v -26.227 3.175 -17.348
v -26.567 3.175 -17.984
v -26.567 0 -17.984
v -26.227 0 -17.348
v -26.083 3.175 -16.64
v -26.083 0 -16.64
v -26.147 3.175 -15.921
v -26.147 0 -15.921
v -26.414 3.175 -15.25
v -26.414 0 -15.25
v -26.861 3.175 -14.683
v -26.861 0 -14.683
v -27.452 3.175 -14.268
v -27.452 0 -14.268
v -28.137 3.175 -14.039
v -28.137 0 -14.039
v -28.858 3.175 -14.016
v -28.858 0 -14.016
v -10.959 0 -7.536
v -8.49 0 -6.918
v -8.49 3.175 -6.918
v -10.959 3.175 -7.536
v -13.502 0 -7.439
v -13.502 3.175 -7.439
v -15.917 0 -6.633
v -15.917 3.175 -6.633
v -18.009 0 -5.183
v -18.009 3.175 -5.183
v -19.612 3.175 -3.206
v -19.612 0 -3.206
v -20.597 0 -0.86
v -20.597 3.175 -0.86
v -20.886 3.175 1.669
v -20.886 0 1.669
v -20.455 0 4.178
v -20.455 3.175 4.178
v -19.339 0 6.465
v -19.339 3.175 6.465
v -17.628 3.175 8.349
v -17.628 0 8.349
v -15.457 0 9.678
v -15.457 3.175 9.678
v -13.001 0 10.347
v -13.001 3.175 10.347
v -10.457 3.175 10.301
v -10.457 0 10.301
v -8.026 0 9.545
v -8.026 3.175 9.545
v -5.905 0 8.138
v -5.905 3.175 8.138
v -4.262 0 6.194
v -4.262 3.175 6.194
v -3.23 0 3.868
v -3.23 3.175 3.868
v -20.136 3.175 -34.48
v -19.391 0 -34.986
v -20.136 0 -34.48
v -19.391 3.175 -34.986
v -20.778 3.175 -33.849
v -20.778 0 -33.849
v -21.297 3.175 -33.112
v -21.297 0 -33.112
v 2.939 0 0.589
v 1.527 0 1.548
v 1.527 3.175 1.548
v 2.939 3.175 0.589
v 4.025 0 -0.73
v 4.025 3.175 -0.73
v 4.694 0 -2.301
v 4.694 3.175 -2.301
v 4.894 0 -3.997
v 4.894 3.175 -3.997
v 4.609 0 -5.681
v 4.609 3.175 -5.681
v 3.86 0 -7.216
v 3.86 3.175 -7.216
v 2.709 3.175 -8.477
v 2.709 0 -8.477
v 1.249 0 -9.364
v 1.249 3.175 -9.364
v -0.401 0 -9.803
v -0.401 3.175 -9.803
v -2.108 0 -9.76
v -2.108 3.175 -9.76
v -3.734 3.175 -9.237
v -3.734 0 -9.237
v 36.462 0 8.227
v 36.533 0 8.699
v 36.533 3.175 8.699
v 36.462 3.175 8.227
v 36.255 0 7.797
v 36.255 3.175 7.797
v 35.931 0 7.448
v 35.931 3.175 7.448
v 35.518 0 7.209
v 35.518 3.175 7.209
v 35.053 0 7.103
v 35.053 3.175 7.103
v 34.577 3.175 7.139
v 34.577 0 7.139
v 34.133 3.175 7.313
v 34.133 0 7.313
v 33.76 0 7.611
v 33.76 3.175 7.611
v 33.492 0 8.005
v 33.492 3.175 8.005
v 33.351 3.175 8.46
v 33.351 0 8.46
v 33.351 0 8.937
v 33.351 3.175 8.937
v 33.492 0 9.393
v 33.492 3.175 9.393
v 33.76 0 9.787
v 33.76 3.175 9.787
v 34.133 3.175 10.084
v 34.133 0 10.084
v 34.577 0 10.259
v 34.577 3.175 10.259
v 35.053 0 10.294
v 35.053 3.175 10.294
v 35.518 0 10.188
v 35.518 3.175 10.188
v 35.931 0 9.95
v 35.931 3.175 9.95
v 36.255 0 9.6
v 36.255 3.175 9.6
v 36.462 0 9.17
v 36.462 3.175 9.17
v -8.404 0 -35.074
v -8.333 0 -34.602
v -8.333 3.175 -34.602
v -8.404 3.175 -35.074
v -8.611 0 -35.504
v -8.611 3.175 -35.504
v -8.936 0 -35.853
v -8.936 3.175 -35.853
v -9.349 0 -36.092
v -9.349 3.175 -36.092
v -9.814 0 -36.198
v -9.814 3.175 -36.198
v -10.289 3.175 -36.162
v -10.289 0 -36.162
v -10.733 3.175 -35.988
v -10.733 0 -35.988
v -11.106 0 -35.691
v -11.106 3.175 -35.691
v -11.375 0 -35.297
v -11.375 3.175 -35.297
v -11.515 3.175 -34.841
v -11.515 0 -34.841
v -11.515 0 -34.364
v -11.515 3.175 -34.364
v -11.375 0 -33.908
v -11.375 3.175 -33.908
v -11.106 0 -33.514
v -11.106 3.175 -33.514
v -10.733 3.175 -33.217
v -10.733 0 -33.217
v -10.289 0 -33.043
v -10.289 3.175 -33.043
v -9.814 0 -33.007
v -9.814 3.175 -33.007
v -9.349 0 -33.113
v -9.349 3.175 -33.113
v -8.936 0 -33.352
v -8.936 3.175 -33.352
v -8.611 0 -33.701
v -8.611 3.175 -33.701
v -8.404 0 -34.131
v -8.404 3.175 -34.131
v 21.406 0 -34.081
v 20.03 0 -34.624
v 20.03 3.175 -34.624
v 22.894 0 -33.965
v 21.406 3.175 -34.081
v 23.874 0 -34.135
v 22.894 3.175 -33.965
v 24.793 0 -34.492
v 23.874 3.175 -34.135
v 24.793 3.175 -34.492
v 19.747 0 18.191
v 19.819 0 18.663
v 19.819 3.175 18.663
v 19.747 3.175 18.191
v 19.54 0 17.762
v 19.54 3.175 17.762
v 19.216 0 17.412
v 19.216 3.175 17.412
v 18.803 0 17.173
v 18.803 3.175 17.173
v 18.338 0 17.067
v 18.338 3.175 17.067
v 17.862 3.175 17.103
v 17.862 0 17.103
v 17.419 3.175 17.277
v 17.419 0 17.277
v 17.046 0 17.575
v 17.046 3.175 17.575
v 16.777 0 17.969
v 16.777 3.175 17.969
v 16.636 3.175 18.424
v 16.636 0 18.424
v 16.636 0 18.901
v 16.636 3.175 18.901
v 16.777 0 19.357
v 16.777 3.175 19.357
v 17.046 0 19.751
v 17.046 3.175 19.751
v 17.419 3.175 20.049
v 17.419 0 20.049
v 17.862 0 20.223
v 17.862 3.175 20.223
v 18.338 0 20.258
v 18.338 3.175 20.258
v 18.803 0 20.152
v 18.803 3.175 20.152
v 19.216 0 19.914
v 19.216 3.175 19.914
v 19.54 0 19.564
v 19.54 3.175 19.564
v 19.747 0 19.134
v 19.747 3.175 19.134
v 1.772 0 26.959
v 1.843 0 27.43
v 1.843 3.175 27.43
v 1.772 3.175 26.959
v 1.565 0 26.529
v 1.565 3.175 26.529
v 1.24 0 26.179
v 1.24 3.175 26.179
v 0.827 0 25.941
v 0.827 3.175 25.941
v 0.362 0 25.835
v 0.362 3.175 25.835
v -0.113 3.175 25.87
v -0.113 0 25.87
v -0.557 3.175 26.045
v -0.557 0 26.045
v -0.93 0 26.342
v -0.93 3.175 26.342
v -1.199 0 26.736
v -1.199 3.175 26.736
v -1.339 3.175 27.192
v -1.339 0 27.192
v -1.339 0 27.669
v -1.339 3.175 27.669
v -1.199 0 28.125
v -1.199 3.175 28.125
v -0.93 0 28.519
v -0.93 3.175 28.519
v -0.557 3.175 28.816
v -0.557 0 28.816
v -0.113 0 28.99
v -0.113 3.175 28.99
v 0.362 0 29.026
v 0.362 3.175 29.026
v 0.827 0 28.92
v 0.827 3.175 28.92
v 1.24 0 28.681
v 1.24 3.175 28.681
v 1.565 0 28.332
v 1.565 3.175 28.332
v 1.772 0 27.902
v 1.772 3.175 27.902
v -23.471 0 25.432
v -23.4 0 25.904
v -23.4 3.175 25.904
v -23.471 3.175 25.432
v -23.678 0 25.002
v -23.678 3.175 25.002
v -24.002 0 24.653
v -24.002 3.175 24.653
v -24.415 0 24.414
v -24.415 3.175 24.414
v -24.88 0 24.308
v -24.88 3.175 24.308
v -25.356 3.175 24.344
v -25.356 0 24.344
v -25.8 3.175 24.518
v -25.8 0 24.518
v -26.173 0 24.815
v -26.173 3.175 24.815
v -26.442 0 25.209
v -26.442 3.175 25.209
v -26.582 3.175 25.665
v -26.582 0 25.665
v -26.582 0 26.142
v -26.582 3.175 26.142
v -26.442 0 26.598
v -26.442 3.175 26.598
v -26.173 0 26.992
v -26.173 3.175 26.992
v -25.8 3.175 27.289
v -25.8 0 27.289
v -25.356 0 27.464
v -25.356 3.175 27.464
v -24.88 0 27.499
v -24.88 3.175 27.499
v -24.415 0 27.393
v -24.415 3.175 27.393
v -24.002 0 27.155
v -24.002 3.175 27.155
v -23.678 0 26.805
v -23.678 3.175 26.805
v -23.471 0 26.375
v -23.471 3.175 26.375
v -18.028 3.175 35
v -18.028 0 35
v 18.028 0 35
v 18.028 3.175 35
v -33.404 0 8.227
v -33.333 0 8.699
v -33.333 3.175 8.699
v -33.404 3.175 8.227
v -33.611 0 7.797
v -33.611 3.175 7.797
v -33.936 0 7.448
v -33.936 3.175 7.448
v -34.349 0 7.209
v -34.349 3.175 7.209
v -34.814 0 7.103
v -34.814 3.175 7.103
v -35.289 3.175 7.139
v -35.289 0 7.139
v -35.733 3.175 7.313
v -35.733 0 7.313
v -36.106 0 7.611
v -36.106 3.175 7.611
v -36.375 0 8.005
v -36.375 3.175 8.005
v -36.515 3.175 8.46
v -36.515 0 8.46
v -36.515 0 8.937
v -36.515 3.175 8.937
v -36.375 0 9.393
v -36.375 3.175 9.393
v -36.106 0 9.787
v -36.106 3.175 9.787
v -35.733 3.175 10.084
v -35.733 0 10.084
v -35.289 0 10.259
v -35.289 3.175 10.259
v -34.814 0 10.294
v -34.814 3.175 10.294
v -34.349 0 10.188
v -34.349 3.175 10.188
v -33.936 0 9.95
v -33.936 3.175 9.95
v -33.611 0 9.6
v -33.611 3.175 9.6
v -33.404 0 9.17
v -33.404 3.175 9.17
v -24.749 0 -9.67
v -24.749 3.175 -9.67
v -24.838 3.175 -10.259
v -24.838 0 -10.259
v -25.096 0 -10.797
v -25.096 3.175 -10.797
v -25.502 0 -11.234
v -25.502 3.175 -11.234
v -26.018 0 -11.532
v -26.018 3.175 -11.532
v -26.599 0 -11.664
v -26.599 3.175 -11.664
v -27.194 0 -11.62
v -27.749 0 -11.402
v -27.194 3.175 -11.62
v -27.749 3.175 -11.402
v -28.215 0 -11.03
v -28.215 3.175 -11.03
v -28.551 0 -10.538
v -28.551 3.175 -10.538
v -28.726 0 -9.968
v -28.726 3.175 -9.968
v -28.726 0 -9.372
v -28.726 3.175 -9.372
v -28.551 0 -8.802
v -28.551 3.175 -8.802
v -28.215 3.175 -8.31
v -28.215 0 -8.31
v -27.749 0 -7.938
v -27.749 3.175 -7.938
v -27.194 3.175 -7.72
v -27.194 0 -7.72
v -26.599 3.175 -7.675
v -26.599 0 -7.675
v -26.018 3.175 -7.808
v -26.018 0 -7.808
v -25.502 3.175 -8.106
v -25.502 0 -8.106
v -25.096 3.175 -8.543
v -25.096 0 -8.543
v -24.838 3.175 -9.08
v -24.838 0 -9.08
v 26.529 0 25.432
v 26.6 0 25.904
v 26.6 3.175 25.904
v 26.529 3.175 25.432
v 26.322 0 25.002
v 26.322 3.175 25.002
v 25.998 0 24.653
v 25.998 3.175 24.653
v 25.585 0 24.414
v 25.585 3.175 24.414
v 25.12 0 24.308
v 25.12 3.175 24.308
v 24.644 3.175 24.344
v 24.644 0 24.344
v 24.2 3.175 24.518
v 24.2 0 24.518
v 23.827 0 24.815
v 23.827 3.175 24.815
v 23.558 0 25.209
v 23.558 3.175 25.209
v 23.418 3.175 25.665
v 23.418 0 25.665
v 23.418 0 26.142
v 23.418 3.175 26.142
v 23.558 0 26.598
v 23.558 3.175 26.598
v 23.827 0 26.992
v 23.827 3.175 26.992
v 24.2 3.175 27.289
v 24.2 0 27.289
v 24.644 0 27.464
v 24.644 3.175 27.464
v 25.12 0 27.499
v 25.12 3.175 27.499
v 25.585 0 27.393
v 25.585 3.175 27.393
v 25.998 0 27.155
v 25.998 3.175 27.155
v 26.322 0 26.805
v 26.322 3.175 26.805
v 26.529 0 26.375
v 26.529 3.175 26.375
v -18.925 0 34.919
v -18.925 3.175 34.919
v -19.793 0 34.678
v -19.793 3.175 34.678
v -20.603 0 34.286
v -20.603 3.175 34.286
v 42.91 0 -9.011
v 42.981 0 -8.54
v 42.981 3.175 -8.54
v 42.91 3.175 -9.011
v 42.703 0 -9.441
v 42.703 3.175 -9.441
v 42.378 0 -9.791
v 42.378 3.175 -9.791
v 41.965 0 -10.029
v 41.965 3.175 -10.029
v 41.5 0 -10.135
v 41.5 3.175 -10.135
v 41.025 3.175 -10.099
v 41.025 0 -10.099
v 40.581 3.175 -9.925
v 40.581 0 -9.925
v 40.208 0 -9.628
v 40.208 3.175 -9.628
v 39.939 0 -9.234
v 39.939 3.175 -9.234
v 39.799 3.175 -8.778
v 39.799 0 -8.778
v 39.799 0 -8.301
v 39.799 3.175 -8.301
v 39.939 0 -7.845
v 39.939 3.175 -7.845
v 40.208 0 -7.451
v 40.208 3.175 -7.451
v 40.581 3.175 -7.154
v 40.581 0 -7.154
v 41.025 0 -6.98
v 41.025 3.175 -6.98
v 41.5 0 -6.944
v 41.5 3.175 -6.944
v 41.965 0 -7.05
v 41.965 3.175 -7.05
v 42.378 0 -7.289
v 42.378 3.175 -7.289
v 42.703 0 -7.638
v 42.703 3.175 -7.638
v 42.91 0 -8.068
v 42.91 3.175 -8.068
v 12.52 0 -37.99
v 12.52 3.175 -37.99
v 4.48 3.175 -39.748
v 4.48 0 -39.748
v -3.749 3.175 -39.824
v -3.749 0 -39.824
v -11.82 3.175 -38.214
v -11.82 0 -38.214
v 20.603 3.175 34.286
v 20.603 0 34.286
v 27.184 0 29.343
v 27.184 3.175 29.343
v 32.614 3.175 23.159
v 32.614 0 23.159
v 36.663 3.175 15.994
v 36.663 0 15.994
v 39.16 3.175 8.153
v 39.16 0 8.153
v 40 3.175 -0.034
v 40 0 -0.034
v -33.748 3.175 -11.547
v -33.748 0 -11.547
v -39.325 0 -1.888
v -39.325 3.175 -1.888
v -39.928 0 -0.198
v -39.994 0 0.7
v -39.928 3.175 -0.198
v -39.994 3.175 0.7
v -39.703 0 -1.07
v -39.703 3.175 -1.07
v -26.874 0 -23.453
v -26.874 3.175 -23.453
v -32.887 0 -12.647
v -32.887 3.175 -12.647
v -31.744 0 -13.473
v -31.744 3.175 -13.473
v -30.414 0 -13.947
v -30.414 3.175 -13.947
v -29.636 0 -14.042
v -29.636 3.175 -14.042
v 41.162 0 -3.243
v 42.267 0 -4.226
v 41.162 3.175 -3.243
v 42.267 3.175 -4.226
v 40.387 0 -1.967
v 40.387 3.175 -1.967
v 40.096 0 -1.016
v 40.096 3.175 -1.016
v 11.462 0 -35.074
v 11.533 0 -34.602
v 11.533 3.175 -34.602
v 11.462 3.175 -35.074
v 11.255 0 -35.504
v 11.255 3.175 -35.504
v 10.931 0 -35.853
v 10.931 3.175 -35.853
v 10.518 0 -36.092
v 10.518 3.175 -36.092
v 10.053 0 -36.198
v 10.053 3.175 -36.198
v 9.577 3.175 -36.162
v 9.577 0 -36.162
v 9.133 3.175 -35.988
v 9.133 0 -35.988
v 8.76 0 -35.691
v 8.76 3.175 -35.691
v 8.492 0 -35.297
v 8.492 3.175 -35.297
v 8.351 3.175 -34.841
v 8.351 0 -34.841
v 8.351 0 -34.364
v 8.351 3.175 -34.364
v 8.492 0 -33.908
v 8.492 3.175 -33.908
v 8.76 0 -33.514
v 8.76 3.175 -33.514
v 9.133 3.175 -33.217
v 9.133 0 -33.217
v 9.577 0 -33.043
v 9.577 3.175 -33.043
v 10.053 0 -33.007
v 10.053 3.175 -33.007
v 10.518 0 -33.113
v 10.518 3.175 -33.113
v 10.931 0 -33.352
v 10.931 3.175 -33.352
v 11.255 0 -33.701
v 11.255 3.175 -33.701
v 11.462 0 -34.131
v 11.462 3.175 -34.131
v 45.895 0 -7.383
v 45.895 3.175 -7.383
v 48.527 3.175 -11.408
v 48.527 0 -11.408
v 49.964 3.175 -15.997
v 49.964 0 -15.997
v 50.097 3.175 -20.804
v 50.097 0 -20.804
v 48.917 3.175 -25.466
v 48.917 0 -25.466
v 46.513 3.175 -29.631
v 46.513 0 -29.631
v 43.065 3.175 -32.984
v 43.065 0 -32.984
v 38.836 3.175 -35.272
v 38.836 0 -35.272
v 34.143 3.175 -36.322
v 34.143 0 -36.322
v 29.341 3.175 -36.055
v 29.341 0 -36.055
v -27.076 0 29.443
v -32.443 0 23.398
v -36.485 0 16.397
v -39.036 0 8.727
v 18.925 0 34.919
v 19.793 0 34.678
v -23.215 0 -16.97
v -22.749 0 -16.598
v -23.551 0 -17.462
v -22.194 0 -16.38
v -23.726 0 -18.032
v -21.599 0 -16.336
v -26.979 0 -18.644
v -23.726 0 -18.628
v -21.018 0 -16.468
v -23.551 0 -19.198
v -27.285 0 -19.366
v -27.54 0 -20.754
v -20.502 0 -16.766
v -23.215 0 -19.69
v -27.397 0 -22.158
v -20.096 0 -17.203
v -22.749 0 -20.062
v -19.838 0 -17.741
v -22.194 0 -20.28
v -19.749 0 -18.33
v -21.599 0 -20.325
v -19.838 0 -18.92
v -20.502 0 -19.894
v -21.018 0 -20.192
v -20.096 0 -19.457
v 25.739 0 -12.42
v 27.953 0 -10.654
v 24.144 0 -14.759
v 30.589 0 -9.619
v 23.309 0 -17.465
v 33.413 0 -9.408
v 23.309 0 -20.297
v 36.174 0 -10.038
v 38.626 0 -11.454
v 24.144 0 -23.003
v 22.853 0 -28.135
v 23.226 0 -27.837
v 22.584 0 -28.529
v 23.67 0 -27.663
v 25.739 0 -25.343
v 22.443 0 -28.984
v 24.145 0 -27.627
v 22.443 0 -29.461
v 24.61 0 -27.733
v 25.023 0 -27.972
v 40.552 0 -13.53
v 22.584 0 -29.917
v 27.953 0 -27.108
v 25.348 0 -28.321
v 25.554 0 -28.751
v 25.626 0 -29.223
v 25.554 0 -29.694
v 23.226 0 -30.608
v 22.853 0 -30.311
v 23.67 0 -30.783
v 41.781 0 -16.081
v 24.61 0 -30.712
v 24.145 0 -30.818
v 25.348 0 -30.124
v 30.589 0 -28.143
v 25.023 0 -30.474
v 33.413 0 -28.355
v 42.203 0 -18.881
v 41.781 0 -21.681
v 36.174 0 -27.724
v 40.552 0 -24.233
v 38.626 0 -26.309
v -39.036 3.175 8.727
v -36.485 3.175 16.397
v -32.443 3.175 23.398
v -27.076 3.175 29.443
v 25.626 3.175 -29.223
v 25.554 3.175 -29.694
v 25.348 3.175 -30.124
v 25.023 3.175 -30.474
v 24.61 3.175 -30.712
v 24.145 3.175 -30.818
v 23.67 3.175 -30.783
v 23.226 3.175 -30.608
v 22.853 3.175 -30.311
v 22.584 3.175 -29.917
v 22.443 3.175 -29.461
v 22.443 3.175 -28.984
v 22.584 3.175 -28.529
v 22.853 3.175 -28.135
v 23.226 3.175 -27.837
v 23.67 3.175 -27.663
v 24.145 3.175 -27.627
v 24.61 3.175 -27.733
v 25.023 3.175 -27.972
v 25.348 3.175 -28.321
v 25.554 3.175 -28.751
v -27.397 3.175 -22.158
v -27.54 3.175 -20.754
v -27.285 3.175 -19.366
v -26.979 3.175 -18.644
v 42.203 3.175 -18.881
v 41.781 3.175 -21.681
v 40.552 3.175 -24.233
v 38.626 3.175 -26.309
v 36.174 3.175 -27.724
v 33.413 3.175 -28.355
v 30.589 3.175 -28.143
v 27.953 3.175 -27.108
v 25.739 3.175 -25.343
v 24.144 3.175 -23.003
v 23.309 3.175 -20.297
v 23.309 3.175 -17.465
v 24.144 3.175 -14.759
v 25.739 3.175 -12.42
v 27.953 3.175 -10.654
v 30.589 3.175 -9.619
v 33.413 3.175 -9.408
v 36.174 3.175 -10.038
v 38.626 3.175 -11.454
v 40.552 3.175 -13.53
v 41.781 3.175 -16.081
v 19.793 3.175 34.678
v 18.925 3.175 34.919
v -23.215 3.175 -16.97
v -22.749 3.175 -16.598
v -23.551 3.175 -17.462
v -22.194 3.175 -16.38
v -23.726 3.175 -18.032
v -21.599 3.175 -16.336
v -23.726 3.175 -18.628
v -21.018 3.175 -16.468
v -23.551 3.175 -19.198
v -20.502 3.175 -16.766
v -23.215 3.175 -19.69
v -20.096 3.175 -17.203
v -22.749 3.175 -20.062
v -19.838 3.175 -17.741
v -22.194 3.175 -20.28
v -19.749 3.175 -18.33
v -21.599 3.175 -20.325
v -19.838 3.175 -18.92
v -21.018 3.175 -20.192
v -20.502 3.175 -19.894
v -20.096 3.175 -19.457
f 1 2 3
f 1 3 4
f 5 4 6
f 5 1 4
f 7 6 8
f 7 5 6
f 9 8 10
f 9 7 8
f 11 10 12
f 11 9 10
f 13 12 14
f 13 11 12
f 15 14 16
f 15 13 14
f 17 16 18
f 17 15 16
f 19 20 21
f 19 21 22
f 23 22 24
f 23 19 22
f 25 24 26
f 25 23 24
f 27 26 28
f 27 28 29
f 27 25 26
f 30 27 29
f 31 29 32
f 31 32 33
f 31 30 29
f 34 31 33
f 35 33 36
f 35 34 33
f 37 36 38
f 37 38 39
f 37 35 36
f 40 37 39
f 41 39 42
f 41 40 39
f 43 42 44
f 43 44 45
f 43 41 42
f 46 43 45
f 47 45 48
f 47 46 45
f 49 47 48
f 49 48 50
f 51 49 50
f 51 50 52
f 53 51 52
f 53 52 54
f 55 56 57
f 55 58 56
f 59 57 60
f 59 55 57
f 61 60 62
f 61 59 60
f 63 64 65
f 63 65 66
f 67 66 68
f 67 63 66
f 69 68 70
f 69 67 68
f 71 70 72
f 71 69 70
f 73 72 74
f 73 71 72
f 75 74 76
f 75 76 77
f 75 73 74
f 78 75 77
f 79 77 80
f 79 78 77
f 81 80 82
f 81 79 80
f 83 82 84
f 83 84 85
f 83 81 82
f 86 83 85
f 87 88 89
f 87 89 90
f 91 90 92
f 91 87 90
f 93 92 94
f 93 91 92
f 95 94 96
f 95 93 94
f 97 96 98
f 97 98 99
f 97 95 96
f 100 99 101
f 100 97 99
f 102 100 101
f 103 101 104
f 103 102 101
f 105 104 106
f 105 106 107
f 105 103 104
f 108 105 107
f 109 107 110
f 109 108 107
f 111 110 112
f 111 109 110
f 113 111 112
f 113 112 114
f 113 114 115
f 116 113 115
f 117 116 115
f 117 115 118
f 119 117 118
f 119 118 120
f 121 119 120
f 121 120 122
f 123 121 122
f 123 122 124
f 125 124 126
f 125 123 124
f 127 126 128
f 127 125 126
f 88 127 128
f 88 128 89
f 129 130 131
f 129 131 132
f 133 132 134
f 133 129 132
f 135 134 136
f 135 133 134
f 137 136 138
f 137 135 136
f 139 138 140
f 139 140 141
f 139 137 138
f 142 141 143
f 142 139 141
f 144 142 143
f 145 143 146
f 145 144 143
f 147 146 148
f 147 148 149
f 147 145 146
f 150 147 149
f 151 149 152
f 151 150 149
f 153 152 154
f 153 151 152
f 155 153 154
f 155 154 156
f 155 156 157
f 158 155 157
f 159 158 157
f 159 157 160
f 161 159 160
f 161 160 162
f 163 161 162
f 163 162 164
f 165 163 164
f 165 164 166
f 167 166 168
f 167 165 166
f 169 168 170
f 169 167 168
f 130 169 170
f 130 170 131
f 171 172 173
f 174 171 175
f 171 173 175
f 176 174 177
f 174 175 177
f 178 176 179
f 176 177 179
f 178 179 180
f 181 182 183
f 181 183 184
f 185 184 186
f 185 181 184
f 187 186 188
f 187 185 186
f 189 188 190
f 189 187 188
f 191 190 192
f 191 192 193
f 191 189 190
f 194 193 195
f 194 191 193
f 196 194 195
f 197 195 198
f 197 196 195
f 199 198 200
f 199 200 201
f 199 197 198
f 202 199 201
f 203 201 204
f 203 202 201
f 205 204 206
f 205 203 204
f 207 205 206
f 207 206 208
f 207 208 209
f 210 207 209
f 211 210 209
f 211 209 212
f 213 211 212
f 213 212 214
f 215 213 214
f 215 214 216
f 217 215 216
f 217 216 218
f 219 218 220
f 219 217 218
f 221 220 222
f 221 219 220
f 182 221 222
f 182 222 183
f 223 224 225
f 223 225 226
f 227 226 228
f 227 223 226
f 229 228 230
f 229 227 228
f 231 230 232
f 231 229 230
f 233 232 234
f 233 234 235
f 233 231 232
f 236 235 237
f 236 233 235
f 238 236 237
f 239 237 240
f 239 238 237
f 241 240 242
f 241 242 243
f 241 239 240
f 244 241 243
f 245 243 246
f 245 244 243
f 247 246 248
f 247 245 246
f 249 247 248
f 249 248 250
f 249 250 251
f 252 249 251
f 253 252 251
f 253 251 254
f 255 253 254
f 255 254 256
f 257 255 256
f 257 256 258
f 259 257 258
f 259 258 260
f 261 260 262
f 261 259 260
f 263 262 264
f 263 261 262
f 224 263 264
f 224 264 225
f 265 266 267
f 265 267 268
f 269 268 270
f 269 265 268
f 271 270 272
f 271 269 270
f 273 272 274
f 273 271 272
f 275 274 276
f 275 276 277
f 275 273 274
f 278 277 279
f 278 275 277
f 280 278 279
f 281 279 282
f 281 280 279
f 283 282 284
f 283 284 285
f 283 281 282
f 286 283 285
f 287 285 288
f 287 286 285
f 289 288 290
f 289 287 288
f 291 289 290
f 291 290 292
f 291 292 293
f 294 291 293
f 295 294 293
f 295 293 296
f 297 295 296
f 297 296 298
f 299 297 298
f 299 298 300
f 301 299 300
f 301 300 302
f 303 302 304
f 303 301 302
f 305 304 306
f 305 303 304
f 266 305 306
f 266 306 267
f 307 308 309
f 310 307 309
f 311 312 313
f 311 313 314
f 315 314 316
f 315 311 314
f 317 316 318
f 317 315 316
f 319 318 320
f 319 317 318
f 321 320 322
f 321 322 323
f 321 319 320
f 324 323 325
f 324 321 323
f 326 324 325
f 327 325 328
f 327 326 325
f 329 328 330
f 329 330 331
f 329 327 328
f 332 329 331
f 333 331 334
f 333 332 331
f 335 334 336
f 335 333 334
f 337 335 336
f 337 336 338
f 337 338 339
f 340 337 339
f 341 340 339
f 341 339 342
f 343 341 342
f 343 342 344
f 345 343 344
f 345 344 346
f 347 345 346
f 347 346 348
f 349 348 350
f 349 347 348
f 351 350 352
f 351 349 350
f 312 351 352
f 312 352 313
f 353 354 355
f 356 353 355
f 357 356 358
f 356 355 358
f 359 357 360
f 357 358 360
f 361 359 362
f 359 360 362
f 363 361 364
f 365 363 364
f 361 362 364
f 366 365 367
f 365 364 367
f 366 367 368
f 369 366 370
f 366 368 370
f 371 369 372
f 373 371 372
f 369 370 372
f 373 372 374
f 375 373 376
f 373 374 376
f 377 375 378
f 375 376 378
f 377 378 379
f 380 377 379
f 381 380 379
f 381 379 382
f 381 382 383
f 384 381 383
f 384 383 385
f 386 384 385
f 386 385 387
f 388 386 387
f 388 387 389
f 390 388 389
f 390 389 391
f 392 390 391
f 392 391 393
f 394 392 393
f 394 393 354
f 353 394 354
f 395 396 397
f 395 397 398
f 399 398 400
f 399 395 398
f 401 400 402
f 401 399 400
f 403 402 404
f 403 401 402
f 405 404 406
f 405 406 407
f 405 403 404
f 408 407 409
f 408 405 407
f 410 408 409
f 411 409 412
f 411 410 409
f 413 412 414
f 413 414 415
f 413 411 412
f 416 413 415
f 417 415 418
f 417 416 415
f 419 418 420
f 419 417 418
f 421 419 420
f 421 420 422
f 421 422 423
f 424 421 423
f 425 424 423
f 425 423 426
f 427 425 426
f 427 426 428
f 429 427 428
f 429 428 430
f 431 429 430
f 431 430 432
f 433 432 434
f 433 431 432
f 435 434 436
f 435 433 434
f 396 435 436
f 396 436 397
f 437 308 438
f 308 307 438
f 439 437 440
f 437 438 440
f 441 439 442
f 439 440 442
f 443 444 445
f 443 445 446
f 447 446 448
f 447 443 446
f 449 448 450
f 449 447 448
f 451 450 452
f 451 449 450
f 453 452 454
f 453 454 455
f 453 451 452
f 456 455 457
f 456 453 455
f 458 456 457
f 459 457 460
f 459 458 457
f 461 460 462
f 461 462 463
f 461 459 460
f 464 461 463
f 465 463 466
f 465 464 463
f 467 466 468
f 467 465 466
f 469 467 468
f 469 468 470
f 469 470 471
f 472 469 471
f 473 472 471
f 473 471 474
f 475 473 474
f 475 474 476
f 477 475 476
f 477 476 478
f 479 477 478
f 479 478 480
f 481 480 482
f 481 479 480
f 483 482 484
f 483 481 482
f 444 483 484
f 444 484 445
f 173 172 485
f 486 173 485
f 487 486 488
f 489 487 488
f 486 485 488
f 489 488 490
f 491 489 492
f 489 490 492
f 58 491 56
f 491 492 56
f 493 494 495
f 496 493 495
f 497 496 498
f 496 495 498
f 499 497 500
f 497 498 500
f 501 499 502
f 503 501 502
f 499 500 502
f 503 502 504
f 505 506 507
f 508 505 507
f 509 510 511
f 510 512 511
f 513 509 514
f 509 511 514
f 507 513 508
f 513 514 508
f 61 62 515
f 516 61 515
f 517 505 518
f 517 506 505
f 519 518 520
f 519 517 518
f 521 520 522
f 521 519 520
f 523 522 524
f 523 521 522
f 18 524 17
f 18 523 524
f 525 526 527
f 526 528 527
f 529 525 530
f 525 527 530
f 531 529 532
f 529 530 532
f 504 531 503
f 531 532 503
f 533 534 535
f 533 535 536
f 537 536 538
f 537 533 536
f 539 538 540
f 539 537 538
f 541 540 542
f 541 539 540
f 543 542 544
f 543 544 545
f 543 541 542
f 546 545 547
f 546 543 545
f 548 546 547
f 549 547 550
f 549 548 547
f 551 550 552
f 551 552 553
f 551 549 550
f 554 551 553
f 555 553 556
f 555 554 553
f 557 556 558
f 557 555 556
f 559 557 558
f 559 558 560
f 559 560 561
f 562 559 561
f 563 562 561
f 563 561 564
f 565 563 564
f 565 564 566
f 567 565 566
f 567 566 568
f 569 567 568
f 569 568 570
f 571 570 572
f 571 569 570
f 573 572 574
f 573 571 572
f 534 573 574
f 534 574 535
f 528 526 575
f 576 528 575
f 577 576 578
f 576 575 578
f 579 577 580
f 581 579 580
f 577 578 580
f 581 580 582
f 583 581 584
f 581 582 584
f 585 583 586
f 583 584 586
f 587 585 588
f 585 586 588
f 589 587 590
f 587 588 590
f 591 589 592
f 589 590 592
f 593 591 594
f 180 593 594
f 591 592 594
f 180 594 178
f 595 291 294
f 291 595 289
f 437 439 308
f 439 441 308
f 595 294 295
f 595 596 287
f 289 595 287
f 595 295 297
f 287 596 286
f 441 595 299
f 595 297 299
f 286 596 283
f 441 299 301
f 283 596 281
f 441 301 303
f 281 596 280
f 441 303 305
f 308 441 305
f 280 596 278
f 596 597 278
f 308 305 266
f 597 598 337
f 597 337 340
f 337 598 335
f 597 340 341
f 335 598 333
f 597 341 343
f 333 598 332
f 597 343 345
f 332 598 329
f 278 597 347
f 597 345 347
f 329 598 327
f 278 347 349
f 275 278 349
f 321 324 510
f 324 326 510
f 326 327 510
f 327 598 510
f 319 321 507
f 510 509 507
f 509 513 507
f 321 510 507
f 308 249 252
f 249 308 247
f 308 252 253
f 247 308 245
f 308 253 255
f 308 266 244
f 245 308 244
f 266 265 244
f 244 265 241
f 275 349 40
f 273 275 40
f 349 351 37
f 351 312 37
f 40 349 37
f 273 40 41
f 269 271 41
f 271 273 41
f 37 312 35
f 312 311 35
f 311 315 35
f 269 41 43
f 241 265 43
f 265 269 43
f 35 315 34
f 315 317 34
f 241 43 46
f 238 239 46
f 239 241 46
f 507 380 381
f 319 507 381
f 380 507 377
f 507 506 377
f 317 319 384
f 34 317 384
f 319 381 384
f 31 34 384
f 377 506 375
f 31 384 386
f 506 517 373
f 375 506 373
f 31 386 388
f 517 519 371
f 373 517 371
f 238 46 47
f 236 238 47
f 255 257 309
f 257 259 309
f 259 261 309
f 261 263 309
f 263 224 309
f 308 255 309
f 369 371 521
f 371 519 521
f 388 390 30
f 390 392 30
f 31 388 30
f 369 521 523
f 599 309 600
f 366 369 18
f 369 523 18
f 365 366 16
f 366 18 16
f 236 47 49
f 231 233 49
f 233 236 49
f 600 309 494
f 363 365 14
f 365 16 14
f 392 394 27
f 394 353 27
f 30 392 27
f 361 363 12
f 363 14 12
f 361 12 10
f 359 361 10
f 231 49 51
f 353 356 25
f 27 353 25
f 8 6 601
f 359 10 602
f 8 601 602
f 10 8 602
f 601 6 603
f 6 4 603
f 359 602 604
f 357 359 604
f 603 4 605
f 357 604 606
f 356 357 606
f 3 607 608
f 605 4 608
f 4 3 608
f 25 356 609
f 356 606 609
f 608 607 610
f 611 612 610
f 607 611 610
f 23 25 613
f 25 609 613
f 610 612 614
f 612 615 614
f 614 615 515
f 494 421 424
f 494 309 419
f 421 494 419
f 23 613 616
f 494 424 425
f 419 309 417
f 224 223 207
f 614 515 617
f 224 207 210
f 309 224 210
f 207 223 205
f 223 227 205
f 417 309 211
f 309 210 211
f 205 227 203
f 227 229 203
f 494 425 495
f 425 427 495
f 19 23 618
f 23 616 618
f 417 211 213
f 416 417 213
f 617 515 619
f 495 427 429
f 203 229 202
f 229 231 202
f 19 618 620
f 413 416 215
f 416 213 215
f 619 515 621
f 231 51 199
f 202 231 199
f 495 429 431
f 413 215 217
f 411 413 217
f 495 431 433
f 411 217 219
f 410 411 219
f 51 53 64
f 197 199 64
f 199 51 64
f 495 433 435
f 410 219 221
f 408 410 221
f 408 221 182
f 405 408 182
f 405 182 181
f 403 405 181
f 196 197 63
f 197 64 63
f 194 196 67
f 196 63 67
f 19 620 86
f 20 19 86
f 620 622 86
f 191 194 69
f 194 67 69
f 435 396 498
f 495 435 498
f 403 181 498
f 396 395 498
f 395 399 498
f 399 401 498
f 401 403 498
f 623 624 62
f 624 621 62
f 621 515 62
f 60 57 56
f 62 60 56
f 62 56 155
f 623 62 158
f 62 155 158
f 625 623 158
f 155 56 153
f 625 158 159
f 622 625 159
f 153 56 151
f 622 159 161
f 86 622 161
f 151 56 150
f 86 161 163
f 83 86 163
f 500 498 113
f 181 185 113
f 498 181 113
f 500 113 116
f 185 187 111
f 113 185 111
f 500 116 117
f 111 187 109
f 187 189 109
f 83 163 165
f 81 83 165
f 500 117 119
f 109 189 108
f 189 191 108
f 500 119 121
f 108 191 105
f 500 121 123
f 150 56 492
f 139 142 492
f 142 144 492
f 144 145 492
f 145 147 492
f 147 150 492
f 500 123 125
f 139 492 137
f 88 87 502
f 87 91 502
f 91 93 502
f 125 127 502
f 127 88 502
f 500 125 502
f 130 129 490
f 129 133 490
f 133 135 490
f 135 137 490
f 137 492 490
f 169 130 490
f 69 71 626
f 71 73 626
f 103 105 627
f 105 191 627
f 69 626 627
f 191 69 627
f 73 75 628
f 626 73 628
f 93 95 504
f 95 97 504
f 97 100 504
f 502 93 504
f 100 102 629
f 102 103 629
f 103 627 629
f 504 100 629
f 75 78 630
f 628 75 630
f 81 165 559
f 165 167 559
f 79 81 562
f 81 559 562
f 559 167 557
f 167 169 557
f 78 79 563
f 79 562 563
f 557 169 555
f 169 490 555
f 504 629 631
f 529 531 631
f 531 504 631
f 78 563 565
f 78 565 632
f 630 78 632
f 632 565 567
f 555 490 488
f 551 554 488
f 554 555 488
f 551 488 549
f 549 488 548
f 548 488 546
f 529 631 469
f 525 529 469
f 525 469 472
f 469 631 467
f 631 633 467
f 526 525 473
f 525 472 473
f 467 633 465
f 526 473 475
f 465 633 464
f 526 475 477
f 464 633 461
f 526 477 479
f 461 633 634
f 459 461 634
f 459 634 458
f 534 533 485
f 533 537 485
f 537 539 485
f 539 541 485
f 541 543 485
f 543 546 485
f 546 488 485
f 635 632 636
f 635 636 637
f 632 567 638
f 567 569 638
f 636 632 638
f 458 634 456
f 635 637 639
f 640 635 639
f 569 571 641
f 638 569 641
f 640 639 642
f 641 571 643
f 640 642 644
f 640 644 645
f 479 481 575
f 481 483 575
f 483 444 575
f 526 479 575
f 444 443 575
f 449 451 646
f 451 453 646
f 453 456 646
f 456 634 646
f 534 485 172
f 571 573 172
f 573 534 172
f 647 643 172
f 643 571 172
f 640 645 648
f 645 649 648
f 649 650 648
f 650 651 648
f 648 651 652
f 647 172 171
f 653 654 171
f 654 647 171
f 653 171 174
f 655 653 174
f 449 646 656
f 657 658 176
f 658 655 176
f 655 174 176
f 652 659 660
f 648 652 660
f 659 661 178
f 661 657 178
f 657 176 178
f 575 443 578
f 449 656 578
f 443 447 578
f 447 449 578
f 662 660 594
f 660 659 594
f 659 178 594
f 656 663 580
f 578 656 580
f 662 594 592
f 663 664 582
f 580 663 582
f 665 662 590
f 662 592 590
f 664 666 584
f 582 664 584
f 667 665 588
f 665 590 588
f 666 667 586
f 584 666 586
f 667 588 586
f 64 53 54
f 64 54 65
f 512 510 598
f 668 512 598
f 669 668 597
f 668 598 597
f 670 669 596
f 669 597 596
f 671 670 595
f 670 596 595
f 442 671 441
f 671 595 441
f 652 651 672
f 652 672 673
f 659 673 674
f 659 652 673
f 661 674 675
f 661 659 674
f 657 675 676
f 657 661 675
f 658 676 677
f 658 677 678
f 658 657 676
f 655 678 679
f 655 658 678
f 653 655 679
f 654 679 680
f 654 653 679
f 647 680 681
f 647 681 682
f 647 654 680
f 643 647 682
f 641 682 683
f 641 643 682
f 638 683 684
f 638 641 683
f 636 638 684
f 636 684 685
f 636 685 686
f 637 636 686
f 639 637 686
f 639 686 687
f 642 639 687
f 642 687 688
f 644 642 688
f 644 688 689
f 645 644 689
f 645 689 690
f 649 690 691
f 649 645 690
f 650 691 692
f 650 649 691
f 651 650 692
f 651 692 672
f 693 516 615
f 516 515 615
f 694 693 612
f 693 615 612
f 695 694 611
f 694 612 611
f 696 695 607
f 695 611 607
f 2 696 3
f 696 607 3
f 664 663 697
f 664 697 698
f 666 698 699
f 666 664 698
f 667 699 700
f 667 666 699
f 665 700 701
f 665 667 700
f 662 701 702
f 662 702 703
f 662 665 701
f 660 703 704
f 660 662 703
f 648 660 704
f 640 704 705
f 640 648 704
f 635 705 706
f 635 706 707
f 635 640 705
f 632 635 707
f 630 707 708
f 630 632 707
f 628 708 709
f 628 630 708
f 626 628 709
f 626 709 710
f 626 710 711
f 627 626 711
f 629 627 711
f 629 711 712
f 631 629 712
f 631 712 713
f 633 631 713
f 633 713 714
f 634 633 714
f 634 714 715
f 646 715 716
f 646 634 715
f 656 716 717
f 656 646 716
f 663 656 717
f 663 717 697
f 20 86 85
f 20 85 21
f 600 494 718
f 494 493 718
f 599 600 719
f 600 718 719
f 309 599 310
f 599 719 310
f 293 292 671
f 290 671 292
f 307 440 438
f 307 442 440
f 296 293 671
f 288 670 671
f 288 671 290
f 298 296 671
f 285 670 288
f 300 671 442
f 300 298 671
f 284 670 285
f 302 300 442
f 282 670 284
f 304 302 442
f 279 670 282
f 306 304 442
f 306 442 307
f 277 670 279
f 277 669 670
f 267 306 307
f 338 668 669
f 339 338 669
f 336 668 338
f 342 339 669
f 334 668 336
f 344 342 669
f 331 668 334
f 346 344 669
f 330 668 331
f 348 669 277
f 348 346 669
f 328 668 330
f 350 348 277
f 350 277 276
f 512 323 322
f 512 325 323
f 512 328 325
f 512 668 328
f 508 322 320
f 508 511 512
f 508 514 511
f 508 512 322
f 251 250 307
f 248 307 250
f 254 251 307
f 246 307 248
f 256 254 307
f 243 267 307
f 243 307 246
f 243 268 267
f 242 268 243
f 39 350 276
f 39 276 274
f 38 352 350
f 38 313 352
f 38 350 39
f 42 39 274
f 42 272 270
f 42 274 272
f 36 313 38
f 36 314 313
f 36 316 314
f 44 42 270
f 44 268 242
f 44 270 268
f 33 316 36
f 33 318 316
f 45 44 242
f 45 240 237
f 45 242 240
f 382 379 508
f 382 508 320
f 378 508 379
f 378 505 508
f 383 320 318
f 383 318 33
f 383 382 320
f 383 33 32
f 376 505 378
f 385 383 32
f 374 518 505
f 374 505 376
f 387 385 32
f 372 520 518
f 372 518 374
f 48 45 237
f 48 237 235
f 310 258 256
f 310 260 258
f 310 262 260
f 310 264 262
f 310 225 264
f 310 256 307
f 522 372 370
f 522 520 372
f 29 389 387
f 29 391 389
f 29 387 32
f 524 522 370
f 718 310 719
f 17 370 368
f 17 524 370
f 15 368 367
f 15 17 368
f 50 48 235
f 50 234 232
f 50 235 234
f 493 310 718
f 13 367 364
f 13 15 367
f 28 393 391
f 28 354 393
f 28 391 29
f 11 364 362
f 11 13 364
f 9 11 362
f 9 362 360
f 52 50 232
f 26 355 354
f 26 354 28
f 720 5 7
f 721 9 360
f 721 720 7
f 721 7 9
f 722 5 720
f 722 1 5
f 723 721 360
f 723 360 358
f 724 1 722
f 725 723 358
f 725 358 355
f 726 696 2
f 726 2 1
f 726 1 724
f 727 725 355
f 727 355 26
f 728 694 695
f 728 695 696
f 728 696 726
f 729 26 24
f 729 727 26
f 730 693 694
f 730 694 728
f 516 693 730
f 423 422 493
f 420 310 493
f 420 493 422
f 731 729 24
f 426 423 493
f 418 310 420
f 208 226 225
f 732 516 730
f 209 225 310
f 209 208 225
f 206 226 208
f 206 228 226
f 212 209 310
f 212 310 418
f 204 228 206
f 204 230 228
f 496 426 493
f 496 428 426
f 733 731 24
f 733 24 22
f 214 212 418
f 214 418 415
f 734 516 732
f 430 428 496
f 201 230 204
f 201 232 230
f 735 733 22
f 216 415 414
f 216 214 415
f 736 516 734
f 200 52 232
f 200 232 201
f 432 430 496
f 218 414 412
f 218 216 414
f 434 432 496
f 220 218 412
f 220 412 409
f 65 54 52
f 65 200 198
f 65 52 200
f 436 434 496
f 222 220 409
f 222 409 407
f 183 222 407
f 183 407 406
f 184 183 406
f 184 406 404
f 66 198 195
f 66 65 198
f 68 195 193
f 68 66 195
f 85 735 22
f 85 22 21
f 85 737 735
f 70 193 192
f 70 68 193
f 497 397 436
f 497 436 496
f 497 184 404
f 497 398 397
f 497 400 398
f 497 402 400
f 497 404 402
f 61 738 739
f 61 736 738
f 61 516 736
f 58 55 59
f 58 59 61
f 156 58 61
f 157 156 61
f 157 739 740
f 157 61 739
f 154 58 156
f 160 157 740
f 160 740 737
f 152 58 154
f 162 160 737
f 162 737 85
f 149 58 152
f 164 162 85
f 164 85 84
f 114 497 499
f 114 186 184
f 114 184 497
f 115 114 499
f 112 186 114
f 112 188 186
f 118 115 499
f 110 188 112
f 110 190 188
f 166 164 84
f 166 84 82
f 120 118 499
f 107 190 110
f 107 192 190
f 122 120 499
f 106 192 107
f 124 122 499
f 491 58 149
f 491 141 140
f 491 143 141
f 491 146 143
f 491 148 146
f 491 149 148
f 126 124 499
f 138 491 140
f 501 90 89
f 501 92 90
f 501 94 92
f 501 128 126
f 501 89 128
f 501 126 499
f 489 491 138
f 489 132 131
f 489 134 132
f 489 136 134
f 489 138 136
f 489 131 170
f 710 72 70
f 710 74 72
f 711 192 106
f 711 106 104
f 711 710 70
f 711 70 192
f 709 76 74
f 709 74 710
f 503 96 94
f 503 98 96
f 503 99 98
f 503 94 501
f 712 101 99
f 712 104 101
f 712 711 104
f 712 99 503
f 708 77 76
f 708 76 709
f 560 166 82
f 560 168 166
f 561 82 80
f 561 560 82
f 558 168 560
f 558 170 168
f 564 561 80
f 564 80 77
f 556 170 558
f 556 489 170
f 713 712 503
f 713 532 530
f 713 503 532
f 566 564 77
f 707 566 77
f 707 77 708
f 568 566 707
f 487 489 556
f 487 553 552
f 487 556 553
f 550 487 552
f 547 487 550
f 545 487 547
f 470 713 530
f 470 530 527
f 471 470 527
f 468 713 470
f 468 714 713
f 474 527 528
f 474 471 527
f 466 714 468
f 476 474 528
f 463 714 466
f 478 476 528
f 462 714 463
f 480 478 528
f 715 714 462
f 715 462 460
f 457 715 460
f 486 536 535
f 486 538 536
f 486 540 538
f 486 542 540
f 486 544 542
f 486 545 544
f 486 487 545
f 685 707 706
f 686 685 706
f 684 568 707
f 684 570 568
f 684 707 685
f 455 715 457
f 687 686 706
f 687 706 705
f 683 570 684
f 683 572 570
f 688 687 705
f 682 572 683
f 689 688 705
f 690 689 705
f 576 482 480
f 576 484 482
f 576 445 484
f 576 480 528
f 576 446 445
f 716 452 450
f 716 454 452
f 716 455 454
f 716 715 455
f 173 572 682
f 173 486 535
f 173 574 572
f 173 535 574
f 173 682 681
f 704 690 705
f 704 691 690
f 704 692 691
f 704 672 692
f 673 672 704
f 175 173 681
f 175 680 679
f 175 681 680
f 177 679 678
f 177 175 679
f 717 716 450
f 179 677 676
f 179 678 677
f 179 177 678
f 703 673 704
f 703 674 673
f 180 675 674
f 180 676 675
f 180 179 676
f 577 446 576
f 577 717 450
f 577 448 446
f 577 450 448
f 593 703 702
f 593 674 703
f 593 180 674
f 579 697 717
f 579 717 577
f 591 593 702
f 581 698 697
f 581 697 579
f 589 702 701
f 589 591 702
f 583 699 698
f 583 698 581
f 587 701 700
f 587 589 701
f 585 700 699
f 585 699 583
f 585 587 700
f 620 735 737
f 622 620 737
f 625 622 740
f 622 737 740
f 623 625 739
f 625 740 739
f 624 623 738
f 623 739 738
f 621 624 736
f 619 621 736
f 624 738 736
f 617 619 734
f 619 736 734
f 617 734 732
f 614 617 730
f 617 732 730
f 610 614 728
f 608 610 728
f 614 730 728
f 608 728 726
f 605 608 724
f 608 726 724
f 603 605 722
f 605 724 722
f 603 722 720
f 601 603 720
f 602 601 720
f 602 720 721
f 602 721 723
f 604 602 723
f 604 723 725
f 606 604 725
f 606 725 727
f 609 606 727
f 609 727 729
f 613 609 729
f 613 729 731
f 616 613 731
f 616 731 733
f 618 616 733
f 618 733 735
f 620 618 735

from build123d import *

# Parameters (mm, degrees)
SKETCH2_R           = 9.5
SKETCH2_R_2         = 1.599999999
BOSS_EXTRUDE1_DEPTH = 3.175
FILLET1_R           = 5
CUT_EXTRUDE1_REACH  = 5.175
SKETCH3_R           = 2
FILLET2_R           = 5


with BuildPart() as part:
    # Sketch2 → Boss-Extrude1 (new body)
    with BuildSketch(Plane(origin=(0, 0, 0), x_dir=(1, 0, 0), z_dir=(0, 1, 0))):
        with BuildLine():
            Line((-20.628430767, 34.270509831), (-39.993347498, 0.729490169))
            ThreePointArc((-39.993347498, 0.729490169), (-34.641016151, -20), (-19.364916731, -35))
            Line((-19.364916731, -35), (19.364916731, -35))
            ThreePointArc((19.364916731, -35), (35.177698311, -19.040208548), (39.892817403, 2.92628085))
            ThreePointArc((39.892817403, 2.92628085), (47.858623368, 27.631189084), (22.480642256, 33.085052875))
            ThreePointArc((22.480642256, 33.085052875), (1.09954486, 39.984884658), (-20.628430767, 34.270509831))
        make_face()
        with Locations((32.703178801, 18.881189084)):
            Circle(SKETCH2_R, mode=Mode.SUBTRACT)
        with Locations((-9.933234274, 34.602468942)):
            Circle(SKETCH2_R_2, mode=Mode.SUBTRACT)
        with Locations((34.933234274, -8.698801248)):
            Circle(SKETCH2_R_2, mode=Mode.SUBTRACT)
        with Locations((24.025546071, 29.222789066)):
            Circle(SKETCH2_R_2, mode=Mode.SUBTRACT)
        with Locations((41.380811532, 8.539589102)):
            Circle(SKETCH2_R_2, mode=Mode.SUBTRACT)
        with Locations((9.933234274, 34.602468942)):
            Circle(SKETCH2_R_2, mode=Mode.SUBTRACT)
        with Locations((18.218514563, -18.662886757)):
            Circle(SKETCH2_R_2, mode=Mode.SUBTRACT)
        with Locations((-25, -25.903667694)):
            Circle(SKETCH2_R_2, mode=Mode.SUBTRACT)
        with Locations((0.242633637, -27.430309692)):
            Circle(SKETCH2_R_2, mode=Mode.SUBTRACT)
        with Locations((25, -25.903667694)):
            Circle(SKETCH2_R_2, mode=Mode.SUBTRACT)
        with Locations((-34.933234274, -8.698801248)):
            Circle(SKETCH2_R_2, mode=Mode.SUBTRACT)
        with BuildLine():
            Line((-3.733919578, 9.237483049), (-8.490154378, 6.917712338))
            ThreePointArc((-8.490154378, 6.917712338), (-19.978367669, -5.361075311), (-3.229700616, -3.867816217))
            Line((-3.229700616, -3.867816217), (1.526534184, -1.548045507))
            ThreePointArc((1.526534184, -1.548045507), (4.289071581, 6.474945652), (-3.733919578, 9.237483049))
        make_face(mode=Mode.SUBTRACT)
    extrude(amount=BOSS_EXTRUDE1_DEPTH)

    # Fillet1
    fillet1_edges = [part.edges().sort_by_distance(p)[0] for p in [
        (39.892817403, 1.5875, -2.92628085),
        (22.480642256, 1.5875, -33.085052875),
    ]]
    fillet(fillet1_edges, radius=FILLET1_R)

    # Sketch3 → Cut-Extrude1 (cut, up to next)
    with BuildSketch(Plane(origin=(0, 3.175, 0), x_dir=(1, 0, 0), z_dir=(0, 1, 0)), mode=Mode.PRIVATE) as cut_extrude1_sk1:
        with Locations((-26.748711306, 9.669872981)):
            Circle(SKETCH3_R)
    cut_extrude1_tool1 = extrude(cut_extrude1_sk1.sketch, amount=-CUT_EXTRUDE1_REACH, mode=Mode.PRIVATE) & part.part
    add(cut_extrude1_tool1.solids().sort_by_distance((-26.748711, 3.175, -9.669873))[0], mode=Mode.SUBTRACT)
    # Sketch3 → Cut-Extrude1 (cut, up to next)
    with BuildSketch(Plane(origin=(0, 3.175, 0), x_dir=(1, 0, 0), z_dir=(0, 1, 0)), mode=Mode.PRIVATE) as cut_extrude1_sk2:
        with Locations((-21.748711306, 18.330127019)):
            Circle(SKETCH3_R)
    cut_extrude1_tool2 = extrude(cut_extrude1_sk2.sketch, amount=-CUT_EXTRUDE1_REACH, mode=Mode.PRIVATE) & part.part
    add(cut_extrude1_tool2.solids().sort_by_distance((-21.748711, 3.175, -18.330127))[0], mode=Mode.SUBTRACT)
    # Sketch3 → Cut-Extrude1 (cut, up to next)
    with BuildSketch(Plane(origin=(0, 3.175, 0), x_dir=(1, 0, 0), z_dir=(0, 1, 0)), mode=Mode.PRIVATE) as cut_extrude1_sk3:
        with BuildLine():
            Line((-29.060889132, 19.665063509), (-27.328838325, 18.665063509))
            ThreePointArc((-27.328838325, 18.665063509), (-26.413774815, 15.25), (-29.828838325, 14.334936491))
            Line((-29.828838325, 14.334936491), (-31.560889132, 15.334936491))
            ThreePointArc((-31.560889132, 15.334936491), (-32.475952642, 18.75), (-29.060889132, 19.665063509))
        make_face()
    cut_extrude1_tool3 = extrude(cut_extrude1_sk3.sketch, amount=-CUT_EXTRUDE1_REACH, mode=Mode.PRIVATE) & part.part
    add(cut_extrude1_tool3.solids().sort_by_distance((-29.444864, 3.175, -17))[0], mode=Mode.SUBTRACT)

    # Fillet2
    fillet2_edges = [part.edges().sort_by_distance(p)[0] for p in [
        (-31.560889132, 1.5875, -15.334936491),
        (-29.060889132, 1.5875, -19.665063509),
        (19.364916731, 1.5875, 35),
        (-19.364916731, 1.5875, 35),
        (-39.993347498, 1.5875, -0.729490169),
        (-20.628430767, 1.5875, -34.270509831),
    ]]
    fillet(fillet2_edges, radius=FILLET2_R)


solid = part.part
